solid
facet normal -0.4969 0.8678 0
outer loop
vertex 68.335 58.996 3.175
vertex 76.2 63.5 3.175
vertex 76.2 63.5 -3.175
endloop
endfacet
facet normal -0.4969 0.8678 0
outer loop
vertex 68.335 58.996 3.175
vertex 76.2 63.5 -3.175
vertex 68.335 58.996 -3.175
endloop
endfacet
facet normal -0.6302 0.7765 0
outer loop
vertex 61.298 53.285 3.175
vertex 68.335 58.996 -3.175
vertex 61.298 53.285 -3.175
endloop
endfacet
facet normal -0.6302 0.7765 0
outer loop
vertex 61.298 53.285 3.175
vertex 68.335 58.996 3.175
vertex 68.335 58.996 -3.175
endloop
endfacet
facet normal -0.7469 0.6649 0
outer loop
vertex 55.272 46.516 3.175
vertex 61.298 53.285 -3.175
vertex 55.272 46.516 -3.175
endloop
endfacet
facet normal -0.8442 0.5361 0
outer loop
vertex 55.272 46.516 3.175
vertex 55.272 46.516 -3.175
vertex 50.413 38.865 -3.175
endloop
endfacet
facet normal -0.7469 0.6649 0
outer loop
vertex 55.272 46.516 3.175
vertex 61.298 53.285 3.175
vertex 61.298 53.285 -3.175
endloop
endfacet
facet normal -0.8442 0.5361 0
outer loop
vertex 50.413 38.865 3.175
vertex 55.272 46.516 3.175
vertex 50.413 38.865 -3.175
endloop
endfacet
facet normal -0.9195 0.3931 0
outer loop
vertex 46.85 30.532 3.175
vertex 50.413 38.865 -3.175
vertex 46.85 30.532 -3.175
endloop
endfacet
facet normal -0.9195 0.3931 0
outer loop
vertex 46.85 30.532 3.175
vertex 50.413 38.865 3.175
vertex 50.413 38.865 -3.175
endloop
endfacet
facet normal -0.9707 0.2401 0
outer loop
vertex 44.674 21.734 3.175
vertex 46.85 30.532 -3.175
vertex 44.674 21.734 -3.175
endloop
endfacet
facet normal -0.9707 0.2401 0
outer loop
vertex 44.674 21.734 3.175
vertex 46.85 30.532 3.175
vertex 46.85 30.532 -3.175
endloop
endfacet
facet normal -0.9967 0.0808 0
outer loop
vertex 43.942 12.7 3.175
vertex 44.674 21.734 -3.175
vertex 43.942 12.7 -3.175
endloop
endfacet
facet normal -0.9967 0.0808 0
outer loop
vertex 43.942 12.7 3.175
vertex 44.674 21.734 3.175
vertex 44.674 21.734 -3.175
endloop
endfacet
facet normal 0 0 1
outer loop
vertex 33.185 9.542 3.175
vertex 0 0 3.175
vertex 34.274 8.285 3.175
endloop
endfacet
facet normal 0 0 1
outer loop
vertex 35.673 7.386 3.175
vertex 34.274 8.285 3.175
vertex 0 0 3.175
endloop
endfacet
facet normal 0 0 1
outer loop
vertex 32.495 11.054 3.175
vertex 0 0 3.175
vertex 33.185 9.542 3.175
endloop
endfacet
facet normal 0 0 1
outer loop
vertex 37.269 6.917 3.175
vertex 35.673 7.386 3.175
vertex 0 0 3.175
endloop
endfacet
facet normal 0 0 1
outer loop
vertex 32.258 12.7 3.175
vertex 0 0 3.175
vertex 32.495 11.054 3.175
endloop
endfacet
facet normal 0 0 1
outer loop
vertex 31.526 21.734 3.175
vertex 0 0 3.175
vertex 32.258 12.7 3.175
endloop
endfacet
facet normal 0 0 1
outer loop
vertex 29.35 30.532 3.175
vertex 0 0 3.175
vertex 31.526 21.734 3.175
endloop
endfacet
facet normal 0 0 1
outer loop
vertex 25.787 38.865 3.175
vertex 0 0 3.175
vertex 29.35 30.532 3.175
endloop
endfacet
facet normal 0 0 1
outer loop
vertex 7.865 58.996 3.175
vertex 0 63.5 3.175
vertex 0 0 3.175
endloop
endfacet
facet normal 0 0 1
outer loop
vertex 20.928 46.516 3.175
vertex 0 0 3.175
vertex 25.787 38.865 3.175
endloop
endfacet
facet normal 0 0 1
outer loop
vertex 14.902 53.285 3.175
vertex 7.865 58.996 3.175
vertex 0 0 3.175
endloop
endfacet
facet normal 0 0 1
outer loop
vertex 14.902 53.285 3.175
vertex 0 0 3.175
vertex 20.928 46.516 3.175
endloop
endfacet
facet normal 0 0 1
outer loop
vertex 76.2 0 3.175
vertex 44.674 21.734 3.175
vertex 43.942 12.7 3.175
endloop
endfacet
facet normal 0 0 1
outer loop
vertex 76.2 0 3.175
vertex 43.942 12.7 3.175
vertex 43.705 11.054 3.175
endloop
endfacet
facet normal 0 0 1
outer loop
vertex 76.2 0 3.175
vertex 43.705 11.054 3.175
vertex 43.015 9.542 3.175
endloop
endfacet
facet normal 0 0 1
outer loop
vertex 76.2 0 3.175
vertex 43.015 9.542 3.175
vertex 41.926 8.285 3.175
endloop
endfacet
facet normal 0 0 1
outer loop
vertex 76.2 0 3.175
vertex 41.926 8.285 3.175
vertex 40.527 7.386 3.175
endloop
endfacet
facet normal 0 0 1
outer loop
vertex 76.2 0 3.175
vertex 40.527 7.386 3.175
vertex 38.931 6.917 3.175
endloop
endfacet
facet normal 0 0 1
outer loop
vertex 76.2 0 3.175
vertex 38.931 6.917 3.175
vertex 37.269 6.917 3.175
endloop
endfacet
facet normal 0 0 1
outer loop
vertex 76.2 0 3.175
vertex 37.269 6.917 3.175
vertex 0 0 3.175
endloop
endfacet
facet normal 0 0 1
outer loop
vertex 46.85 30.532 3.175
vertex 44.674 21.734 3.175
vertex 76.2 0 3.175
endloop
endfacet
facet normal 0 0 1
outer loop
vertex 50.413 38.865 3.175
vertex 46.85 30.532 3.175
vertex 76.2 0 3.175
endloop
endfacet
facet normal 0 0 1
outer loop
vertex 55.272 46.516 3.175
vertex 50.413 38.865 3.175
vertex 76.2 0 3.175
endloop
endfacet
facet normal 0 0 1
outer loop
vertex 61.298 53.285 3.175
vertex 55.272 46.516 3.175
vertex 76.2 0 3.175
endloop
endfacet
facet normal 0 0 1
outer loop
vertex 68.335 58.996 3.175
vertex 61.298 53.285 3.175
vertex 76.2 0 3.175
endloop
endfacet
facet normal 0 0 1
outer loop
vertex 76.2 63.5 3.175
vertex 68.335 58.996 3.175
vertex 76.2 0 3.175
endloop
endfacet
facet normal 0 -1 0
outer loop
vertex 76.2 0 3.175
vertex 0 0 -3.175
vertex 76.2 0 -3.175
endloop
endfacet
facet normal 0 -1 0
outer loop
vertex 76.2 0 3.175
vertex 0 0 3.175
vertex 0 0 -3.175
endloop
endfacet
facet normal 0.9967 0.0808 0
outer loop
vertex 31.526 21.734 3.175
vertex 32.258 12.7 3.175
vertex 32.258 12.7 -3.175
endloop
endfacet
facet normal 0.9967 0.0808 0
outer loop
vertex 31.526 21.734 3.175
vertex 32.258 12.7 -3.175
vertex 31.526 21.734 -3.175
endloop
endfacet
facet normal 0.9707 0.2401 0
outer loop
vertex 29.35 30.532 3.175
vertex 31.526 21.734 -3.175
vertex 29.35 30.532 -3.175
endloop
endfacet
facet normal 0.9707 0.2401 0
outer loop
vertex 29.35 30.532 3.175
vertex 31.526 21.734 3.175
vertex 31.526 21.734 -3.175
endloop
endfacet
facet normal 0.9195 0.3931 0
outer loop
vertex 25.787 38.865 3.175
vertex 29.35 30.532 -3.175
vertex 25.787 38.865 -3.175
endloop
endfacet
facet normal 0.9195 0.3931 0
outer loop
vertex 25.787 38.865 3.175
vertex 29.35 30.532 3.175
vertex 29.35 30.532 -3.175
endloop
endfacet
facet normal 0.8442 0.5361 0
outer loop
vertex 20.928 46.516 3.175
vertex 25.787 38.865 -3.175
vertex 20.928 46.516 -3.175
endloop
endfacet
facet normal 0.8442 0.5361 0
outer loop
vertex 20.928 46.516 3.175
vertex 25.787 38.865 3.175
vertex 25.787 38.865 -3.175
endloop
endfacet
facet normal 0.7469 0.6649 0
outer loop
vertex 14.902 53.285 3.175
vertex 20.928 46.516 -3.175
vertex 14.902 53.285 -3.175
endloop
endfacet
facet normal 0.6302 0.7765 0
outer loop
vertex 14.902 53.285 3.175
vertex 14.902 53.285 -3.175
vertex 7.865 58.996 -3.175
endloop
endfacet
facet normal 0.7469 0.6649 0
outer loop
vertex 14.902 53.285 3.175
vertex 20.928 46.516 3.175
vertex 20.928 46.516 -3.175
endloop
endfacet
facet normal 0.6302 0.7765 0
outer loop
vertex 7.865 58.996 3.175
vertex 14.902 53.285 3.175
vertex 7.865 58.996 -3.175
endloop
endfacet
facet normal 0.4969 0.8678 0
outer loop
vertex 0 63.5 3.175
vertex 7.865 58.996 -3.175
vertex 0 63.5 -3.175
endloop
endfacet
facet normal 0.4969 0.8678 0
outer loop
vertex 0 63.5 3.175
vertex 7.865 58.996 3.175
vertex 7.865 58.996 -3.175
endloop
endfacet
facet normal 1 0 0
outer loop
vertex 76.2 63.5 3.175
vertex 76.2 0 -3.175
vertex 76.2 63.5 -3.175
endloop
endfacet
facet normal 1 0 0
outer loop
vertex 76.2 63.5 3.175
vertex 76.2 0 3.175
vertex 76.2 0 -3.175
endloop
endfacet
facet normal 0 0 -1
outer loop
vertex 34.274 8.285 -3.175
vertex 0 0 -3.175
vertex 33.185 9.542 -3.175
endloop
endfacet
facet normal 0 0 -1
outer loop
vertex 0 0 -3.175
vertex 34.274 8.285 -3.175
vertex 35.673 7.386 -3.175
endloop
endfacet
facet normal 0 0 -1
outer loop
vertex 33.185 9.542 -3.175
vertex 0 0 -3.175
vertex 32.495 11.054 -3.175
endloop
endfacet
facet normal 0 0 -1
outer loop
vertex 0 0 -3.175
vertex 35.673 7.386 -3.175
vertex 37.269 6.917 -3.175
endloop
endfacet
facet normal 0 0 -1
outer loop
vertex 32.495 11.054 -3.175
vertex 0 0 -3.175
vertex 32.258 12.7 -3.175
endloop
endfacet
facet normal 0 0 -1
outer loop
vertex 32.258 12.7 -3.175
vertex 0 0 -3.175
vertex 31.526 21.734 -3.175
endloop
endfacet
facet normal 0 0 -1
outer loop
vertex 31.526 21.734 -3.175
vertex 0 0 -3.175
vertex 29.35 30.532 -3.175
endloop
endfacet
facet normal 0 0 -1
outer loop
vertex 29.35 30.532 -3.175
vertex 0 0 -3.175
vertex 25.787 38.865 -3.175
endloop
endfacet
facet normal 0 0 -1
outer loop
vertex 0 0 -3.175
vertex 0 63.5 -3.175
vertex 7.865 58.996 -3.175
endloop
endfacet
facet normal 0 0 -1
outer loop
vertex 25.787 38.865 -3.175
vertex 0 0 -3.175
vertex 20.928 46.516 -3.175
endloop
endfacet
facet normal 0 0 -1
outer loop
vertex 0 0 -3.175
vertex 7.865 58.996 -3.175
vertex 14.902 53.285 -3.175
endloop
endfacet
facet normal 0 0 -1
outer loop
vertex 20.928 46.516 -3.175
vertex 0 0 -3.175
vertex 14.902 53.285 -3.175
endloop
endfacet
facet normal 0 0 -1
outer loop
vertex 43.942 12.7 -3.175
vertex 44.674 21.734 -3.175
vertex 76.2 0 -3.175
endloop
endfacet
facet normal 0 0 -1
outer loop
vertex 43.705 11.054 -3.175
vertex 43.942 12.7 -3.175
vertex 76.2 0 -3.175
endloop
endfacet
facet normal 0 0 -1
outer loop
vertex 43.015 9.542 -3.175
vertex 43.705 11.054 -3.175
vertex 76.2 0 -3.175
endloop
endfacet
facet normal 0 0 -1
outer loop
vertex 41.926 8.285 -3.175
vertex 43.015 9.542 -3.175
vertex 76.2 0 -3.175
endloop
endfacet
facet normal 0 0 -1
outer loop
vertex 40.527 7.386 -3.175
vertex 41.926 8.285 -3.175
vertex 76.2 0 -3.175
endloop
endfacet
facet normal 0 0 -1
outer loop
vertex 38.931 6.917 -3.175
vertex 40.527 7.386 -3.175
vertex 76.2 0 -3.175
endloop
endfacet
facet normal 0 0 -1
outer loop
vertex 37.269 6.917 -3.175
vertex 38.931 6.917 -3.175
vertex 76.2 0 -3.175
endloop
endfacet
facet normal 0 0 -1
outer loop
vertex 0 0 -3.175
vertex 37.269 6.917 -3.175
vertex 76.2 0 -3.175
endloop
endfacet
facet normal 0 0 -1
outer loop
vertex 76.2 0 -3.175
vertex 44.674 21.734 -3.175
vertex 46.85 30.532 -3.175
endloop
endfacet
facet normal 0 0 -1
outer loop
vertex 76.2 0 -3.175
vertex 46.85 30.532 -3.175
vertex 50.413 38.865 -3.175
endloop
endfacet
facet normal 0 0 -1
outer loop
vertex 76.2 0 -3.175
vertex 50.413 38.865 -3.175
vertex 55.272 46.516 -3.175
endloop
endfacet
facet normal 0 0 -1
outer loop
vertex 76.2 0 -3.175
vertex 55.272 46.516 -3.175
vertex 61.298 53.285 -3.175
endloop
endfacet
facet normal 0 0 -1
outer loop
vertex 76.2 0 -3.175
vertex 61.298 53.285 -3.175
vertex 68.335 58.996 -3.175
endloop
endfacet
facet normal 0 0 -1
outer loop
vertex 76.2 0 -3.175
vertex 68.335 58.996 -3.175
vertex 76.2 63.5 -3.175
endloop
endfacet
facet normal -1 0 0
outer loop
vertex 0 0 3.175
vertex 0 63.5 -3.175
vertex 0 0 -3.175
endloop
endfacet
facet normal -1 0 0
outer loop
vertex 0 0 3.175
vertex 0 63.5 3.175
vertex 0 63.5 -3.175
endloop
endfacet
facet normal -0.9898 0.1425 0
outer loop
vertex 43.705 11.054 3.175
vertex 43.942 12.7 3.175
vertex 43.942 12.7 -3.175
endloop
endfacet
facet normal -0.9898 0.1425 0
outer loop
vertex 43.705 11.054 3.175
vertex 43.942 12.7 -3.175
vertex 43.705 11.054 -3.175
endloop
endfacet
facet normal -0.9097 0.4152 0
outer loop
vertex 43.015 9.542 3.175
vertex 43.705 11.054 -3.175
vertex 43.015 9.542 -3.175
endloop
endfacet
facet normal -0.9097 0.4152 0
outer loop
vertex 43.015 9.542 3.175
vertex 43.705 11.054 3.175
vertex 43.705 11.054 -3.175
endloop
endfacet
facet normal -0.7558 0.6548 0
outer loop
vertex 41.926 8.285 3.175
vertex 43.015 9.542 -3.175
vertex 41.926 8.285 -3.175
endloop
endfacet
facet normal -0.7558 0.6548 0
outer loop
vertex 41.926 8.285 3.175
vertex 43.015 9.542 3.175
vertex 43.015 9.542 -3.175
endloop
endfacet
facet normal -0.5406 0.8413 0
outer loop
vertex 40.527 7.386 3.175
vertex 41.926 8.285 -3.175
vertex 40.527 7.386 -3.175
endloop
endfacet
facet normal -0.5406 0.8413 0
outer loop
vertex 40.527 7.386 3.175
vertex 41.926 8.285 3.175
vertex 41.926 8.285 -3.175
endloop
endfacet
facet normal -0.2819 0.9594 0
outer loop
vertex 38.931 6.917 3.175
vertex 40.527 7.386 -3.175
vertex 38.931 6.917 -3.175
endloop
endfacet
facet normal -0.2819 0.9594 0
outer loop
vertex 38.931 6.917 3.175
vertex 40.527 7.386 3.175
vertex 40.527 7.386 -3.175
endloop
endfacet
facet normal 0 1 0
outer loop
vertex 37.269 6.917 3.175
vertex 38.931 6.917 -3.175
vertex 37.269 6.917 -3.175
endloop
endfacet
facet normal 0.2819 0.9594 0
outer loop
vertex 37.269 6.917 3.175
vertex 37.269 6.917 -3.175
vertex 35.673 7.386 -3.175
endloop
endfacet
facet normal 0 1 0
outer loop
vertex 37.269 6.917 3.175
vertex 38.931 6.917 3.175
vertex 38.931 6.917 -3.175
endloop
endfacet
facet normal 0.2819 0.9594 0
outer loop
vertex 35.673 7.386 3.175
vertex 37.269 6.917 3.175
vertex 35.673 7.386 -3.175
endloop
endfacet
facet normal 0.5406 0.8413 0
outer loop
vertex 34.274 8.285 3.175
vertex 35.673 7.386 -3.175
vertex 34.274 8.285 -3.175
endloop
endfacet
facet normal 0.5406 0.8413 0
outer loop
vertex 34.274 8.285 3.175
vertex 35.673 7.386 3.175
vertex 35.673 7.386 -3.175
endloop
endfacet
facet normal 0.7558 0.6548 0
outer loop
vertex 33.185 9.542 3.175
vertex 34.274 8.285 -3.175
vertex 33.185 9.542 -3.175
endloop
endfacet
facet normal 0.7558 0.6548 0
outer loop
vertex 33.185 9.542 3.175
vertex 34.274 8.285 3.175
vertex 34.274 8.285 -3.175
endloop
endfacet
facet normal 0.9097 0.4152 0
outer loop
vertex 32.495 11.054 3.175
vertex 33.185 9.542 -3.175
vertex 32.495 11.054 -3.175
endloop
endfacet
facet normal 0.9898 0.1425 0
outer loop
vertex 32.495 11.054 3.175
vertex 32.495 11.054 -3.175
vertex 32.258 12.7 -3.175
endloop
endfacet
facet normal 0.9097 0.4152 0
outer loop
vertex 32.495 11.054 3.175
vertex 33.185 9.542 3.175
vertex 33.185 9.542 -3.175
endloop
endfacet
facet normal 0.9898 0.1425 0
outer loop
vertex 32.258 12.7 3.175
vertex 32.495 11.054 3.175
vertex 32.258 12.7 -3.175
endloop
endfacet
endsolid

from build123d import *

# Parameters (mm, degrees)
BOSS_EXTRUDE2_DEPTH = 3.175


with BuildPart() as part:
    # Sketch1 → Boss-Extrude2 (new, symmetric)
    with BuildSketch(Plane.XY):
        with BuildLine():
            Line((76.2, 0), (76.2, 6.35))
            Line((76.2, 6.35), (76.2, 63.5))
            ThreePointArc((76.2, 63.5), (52.687880643, 42.788280792), (43.942, 12.7))
            ThreePointArc((43.942, 12.7), (38.1, 6.858), (32.258, 12.7))
            ThreePointArc((32.258, 12.7), (23.512119357, 42.788280792), (0, 63.5))
            Line((0, 63.5), (0, 6.35))
            Line((0, 6.35), (0, 0))
            Line((0, 0), (76.2, 0))
        make_face()
    extrude(amount=BOSS_EXTRUDE2_DEPTH, both=True)


solid = part.part
